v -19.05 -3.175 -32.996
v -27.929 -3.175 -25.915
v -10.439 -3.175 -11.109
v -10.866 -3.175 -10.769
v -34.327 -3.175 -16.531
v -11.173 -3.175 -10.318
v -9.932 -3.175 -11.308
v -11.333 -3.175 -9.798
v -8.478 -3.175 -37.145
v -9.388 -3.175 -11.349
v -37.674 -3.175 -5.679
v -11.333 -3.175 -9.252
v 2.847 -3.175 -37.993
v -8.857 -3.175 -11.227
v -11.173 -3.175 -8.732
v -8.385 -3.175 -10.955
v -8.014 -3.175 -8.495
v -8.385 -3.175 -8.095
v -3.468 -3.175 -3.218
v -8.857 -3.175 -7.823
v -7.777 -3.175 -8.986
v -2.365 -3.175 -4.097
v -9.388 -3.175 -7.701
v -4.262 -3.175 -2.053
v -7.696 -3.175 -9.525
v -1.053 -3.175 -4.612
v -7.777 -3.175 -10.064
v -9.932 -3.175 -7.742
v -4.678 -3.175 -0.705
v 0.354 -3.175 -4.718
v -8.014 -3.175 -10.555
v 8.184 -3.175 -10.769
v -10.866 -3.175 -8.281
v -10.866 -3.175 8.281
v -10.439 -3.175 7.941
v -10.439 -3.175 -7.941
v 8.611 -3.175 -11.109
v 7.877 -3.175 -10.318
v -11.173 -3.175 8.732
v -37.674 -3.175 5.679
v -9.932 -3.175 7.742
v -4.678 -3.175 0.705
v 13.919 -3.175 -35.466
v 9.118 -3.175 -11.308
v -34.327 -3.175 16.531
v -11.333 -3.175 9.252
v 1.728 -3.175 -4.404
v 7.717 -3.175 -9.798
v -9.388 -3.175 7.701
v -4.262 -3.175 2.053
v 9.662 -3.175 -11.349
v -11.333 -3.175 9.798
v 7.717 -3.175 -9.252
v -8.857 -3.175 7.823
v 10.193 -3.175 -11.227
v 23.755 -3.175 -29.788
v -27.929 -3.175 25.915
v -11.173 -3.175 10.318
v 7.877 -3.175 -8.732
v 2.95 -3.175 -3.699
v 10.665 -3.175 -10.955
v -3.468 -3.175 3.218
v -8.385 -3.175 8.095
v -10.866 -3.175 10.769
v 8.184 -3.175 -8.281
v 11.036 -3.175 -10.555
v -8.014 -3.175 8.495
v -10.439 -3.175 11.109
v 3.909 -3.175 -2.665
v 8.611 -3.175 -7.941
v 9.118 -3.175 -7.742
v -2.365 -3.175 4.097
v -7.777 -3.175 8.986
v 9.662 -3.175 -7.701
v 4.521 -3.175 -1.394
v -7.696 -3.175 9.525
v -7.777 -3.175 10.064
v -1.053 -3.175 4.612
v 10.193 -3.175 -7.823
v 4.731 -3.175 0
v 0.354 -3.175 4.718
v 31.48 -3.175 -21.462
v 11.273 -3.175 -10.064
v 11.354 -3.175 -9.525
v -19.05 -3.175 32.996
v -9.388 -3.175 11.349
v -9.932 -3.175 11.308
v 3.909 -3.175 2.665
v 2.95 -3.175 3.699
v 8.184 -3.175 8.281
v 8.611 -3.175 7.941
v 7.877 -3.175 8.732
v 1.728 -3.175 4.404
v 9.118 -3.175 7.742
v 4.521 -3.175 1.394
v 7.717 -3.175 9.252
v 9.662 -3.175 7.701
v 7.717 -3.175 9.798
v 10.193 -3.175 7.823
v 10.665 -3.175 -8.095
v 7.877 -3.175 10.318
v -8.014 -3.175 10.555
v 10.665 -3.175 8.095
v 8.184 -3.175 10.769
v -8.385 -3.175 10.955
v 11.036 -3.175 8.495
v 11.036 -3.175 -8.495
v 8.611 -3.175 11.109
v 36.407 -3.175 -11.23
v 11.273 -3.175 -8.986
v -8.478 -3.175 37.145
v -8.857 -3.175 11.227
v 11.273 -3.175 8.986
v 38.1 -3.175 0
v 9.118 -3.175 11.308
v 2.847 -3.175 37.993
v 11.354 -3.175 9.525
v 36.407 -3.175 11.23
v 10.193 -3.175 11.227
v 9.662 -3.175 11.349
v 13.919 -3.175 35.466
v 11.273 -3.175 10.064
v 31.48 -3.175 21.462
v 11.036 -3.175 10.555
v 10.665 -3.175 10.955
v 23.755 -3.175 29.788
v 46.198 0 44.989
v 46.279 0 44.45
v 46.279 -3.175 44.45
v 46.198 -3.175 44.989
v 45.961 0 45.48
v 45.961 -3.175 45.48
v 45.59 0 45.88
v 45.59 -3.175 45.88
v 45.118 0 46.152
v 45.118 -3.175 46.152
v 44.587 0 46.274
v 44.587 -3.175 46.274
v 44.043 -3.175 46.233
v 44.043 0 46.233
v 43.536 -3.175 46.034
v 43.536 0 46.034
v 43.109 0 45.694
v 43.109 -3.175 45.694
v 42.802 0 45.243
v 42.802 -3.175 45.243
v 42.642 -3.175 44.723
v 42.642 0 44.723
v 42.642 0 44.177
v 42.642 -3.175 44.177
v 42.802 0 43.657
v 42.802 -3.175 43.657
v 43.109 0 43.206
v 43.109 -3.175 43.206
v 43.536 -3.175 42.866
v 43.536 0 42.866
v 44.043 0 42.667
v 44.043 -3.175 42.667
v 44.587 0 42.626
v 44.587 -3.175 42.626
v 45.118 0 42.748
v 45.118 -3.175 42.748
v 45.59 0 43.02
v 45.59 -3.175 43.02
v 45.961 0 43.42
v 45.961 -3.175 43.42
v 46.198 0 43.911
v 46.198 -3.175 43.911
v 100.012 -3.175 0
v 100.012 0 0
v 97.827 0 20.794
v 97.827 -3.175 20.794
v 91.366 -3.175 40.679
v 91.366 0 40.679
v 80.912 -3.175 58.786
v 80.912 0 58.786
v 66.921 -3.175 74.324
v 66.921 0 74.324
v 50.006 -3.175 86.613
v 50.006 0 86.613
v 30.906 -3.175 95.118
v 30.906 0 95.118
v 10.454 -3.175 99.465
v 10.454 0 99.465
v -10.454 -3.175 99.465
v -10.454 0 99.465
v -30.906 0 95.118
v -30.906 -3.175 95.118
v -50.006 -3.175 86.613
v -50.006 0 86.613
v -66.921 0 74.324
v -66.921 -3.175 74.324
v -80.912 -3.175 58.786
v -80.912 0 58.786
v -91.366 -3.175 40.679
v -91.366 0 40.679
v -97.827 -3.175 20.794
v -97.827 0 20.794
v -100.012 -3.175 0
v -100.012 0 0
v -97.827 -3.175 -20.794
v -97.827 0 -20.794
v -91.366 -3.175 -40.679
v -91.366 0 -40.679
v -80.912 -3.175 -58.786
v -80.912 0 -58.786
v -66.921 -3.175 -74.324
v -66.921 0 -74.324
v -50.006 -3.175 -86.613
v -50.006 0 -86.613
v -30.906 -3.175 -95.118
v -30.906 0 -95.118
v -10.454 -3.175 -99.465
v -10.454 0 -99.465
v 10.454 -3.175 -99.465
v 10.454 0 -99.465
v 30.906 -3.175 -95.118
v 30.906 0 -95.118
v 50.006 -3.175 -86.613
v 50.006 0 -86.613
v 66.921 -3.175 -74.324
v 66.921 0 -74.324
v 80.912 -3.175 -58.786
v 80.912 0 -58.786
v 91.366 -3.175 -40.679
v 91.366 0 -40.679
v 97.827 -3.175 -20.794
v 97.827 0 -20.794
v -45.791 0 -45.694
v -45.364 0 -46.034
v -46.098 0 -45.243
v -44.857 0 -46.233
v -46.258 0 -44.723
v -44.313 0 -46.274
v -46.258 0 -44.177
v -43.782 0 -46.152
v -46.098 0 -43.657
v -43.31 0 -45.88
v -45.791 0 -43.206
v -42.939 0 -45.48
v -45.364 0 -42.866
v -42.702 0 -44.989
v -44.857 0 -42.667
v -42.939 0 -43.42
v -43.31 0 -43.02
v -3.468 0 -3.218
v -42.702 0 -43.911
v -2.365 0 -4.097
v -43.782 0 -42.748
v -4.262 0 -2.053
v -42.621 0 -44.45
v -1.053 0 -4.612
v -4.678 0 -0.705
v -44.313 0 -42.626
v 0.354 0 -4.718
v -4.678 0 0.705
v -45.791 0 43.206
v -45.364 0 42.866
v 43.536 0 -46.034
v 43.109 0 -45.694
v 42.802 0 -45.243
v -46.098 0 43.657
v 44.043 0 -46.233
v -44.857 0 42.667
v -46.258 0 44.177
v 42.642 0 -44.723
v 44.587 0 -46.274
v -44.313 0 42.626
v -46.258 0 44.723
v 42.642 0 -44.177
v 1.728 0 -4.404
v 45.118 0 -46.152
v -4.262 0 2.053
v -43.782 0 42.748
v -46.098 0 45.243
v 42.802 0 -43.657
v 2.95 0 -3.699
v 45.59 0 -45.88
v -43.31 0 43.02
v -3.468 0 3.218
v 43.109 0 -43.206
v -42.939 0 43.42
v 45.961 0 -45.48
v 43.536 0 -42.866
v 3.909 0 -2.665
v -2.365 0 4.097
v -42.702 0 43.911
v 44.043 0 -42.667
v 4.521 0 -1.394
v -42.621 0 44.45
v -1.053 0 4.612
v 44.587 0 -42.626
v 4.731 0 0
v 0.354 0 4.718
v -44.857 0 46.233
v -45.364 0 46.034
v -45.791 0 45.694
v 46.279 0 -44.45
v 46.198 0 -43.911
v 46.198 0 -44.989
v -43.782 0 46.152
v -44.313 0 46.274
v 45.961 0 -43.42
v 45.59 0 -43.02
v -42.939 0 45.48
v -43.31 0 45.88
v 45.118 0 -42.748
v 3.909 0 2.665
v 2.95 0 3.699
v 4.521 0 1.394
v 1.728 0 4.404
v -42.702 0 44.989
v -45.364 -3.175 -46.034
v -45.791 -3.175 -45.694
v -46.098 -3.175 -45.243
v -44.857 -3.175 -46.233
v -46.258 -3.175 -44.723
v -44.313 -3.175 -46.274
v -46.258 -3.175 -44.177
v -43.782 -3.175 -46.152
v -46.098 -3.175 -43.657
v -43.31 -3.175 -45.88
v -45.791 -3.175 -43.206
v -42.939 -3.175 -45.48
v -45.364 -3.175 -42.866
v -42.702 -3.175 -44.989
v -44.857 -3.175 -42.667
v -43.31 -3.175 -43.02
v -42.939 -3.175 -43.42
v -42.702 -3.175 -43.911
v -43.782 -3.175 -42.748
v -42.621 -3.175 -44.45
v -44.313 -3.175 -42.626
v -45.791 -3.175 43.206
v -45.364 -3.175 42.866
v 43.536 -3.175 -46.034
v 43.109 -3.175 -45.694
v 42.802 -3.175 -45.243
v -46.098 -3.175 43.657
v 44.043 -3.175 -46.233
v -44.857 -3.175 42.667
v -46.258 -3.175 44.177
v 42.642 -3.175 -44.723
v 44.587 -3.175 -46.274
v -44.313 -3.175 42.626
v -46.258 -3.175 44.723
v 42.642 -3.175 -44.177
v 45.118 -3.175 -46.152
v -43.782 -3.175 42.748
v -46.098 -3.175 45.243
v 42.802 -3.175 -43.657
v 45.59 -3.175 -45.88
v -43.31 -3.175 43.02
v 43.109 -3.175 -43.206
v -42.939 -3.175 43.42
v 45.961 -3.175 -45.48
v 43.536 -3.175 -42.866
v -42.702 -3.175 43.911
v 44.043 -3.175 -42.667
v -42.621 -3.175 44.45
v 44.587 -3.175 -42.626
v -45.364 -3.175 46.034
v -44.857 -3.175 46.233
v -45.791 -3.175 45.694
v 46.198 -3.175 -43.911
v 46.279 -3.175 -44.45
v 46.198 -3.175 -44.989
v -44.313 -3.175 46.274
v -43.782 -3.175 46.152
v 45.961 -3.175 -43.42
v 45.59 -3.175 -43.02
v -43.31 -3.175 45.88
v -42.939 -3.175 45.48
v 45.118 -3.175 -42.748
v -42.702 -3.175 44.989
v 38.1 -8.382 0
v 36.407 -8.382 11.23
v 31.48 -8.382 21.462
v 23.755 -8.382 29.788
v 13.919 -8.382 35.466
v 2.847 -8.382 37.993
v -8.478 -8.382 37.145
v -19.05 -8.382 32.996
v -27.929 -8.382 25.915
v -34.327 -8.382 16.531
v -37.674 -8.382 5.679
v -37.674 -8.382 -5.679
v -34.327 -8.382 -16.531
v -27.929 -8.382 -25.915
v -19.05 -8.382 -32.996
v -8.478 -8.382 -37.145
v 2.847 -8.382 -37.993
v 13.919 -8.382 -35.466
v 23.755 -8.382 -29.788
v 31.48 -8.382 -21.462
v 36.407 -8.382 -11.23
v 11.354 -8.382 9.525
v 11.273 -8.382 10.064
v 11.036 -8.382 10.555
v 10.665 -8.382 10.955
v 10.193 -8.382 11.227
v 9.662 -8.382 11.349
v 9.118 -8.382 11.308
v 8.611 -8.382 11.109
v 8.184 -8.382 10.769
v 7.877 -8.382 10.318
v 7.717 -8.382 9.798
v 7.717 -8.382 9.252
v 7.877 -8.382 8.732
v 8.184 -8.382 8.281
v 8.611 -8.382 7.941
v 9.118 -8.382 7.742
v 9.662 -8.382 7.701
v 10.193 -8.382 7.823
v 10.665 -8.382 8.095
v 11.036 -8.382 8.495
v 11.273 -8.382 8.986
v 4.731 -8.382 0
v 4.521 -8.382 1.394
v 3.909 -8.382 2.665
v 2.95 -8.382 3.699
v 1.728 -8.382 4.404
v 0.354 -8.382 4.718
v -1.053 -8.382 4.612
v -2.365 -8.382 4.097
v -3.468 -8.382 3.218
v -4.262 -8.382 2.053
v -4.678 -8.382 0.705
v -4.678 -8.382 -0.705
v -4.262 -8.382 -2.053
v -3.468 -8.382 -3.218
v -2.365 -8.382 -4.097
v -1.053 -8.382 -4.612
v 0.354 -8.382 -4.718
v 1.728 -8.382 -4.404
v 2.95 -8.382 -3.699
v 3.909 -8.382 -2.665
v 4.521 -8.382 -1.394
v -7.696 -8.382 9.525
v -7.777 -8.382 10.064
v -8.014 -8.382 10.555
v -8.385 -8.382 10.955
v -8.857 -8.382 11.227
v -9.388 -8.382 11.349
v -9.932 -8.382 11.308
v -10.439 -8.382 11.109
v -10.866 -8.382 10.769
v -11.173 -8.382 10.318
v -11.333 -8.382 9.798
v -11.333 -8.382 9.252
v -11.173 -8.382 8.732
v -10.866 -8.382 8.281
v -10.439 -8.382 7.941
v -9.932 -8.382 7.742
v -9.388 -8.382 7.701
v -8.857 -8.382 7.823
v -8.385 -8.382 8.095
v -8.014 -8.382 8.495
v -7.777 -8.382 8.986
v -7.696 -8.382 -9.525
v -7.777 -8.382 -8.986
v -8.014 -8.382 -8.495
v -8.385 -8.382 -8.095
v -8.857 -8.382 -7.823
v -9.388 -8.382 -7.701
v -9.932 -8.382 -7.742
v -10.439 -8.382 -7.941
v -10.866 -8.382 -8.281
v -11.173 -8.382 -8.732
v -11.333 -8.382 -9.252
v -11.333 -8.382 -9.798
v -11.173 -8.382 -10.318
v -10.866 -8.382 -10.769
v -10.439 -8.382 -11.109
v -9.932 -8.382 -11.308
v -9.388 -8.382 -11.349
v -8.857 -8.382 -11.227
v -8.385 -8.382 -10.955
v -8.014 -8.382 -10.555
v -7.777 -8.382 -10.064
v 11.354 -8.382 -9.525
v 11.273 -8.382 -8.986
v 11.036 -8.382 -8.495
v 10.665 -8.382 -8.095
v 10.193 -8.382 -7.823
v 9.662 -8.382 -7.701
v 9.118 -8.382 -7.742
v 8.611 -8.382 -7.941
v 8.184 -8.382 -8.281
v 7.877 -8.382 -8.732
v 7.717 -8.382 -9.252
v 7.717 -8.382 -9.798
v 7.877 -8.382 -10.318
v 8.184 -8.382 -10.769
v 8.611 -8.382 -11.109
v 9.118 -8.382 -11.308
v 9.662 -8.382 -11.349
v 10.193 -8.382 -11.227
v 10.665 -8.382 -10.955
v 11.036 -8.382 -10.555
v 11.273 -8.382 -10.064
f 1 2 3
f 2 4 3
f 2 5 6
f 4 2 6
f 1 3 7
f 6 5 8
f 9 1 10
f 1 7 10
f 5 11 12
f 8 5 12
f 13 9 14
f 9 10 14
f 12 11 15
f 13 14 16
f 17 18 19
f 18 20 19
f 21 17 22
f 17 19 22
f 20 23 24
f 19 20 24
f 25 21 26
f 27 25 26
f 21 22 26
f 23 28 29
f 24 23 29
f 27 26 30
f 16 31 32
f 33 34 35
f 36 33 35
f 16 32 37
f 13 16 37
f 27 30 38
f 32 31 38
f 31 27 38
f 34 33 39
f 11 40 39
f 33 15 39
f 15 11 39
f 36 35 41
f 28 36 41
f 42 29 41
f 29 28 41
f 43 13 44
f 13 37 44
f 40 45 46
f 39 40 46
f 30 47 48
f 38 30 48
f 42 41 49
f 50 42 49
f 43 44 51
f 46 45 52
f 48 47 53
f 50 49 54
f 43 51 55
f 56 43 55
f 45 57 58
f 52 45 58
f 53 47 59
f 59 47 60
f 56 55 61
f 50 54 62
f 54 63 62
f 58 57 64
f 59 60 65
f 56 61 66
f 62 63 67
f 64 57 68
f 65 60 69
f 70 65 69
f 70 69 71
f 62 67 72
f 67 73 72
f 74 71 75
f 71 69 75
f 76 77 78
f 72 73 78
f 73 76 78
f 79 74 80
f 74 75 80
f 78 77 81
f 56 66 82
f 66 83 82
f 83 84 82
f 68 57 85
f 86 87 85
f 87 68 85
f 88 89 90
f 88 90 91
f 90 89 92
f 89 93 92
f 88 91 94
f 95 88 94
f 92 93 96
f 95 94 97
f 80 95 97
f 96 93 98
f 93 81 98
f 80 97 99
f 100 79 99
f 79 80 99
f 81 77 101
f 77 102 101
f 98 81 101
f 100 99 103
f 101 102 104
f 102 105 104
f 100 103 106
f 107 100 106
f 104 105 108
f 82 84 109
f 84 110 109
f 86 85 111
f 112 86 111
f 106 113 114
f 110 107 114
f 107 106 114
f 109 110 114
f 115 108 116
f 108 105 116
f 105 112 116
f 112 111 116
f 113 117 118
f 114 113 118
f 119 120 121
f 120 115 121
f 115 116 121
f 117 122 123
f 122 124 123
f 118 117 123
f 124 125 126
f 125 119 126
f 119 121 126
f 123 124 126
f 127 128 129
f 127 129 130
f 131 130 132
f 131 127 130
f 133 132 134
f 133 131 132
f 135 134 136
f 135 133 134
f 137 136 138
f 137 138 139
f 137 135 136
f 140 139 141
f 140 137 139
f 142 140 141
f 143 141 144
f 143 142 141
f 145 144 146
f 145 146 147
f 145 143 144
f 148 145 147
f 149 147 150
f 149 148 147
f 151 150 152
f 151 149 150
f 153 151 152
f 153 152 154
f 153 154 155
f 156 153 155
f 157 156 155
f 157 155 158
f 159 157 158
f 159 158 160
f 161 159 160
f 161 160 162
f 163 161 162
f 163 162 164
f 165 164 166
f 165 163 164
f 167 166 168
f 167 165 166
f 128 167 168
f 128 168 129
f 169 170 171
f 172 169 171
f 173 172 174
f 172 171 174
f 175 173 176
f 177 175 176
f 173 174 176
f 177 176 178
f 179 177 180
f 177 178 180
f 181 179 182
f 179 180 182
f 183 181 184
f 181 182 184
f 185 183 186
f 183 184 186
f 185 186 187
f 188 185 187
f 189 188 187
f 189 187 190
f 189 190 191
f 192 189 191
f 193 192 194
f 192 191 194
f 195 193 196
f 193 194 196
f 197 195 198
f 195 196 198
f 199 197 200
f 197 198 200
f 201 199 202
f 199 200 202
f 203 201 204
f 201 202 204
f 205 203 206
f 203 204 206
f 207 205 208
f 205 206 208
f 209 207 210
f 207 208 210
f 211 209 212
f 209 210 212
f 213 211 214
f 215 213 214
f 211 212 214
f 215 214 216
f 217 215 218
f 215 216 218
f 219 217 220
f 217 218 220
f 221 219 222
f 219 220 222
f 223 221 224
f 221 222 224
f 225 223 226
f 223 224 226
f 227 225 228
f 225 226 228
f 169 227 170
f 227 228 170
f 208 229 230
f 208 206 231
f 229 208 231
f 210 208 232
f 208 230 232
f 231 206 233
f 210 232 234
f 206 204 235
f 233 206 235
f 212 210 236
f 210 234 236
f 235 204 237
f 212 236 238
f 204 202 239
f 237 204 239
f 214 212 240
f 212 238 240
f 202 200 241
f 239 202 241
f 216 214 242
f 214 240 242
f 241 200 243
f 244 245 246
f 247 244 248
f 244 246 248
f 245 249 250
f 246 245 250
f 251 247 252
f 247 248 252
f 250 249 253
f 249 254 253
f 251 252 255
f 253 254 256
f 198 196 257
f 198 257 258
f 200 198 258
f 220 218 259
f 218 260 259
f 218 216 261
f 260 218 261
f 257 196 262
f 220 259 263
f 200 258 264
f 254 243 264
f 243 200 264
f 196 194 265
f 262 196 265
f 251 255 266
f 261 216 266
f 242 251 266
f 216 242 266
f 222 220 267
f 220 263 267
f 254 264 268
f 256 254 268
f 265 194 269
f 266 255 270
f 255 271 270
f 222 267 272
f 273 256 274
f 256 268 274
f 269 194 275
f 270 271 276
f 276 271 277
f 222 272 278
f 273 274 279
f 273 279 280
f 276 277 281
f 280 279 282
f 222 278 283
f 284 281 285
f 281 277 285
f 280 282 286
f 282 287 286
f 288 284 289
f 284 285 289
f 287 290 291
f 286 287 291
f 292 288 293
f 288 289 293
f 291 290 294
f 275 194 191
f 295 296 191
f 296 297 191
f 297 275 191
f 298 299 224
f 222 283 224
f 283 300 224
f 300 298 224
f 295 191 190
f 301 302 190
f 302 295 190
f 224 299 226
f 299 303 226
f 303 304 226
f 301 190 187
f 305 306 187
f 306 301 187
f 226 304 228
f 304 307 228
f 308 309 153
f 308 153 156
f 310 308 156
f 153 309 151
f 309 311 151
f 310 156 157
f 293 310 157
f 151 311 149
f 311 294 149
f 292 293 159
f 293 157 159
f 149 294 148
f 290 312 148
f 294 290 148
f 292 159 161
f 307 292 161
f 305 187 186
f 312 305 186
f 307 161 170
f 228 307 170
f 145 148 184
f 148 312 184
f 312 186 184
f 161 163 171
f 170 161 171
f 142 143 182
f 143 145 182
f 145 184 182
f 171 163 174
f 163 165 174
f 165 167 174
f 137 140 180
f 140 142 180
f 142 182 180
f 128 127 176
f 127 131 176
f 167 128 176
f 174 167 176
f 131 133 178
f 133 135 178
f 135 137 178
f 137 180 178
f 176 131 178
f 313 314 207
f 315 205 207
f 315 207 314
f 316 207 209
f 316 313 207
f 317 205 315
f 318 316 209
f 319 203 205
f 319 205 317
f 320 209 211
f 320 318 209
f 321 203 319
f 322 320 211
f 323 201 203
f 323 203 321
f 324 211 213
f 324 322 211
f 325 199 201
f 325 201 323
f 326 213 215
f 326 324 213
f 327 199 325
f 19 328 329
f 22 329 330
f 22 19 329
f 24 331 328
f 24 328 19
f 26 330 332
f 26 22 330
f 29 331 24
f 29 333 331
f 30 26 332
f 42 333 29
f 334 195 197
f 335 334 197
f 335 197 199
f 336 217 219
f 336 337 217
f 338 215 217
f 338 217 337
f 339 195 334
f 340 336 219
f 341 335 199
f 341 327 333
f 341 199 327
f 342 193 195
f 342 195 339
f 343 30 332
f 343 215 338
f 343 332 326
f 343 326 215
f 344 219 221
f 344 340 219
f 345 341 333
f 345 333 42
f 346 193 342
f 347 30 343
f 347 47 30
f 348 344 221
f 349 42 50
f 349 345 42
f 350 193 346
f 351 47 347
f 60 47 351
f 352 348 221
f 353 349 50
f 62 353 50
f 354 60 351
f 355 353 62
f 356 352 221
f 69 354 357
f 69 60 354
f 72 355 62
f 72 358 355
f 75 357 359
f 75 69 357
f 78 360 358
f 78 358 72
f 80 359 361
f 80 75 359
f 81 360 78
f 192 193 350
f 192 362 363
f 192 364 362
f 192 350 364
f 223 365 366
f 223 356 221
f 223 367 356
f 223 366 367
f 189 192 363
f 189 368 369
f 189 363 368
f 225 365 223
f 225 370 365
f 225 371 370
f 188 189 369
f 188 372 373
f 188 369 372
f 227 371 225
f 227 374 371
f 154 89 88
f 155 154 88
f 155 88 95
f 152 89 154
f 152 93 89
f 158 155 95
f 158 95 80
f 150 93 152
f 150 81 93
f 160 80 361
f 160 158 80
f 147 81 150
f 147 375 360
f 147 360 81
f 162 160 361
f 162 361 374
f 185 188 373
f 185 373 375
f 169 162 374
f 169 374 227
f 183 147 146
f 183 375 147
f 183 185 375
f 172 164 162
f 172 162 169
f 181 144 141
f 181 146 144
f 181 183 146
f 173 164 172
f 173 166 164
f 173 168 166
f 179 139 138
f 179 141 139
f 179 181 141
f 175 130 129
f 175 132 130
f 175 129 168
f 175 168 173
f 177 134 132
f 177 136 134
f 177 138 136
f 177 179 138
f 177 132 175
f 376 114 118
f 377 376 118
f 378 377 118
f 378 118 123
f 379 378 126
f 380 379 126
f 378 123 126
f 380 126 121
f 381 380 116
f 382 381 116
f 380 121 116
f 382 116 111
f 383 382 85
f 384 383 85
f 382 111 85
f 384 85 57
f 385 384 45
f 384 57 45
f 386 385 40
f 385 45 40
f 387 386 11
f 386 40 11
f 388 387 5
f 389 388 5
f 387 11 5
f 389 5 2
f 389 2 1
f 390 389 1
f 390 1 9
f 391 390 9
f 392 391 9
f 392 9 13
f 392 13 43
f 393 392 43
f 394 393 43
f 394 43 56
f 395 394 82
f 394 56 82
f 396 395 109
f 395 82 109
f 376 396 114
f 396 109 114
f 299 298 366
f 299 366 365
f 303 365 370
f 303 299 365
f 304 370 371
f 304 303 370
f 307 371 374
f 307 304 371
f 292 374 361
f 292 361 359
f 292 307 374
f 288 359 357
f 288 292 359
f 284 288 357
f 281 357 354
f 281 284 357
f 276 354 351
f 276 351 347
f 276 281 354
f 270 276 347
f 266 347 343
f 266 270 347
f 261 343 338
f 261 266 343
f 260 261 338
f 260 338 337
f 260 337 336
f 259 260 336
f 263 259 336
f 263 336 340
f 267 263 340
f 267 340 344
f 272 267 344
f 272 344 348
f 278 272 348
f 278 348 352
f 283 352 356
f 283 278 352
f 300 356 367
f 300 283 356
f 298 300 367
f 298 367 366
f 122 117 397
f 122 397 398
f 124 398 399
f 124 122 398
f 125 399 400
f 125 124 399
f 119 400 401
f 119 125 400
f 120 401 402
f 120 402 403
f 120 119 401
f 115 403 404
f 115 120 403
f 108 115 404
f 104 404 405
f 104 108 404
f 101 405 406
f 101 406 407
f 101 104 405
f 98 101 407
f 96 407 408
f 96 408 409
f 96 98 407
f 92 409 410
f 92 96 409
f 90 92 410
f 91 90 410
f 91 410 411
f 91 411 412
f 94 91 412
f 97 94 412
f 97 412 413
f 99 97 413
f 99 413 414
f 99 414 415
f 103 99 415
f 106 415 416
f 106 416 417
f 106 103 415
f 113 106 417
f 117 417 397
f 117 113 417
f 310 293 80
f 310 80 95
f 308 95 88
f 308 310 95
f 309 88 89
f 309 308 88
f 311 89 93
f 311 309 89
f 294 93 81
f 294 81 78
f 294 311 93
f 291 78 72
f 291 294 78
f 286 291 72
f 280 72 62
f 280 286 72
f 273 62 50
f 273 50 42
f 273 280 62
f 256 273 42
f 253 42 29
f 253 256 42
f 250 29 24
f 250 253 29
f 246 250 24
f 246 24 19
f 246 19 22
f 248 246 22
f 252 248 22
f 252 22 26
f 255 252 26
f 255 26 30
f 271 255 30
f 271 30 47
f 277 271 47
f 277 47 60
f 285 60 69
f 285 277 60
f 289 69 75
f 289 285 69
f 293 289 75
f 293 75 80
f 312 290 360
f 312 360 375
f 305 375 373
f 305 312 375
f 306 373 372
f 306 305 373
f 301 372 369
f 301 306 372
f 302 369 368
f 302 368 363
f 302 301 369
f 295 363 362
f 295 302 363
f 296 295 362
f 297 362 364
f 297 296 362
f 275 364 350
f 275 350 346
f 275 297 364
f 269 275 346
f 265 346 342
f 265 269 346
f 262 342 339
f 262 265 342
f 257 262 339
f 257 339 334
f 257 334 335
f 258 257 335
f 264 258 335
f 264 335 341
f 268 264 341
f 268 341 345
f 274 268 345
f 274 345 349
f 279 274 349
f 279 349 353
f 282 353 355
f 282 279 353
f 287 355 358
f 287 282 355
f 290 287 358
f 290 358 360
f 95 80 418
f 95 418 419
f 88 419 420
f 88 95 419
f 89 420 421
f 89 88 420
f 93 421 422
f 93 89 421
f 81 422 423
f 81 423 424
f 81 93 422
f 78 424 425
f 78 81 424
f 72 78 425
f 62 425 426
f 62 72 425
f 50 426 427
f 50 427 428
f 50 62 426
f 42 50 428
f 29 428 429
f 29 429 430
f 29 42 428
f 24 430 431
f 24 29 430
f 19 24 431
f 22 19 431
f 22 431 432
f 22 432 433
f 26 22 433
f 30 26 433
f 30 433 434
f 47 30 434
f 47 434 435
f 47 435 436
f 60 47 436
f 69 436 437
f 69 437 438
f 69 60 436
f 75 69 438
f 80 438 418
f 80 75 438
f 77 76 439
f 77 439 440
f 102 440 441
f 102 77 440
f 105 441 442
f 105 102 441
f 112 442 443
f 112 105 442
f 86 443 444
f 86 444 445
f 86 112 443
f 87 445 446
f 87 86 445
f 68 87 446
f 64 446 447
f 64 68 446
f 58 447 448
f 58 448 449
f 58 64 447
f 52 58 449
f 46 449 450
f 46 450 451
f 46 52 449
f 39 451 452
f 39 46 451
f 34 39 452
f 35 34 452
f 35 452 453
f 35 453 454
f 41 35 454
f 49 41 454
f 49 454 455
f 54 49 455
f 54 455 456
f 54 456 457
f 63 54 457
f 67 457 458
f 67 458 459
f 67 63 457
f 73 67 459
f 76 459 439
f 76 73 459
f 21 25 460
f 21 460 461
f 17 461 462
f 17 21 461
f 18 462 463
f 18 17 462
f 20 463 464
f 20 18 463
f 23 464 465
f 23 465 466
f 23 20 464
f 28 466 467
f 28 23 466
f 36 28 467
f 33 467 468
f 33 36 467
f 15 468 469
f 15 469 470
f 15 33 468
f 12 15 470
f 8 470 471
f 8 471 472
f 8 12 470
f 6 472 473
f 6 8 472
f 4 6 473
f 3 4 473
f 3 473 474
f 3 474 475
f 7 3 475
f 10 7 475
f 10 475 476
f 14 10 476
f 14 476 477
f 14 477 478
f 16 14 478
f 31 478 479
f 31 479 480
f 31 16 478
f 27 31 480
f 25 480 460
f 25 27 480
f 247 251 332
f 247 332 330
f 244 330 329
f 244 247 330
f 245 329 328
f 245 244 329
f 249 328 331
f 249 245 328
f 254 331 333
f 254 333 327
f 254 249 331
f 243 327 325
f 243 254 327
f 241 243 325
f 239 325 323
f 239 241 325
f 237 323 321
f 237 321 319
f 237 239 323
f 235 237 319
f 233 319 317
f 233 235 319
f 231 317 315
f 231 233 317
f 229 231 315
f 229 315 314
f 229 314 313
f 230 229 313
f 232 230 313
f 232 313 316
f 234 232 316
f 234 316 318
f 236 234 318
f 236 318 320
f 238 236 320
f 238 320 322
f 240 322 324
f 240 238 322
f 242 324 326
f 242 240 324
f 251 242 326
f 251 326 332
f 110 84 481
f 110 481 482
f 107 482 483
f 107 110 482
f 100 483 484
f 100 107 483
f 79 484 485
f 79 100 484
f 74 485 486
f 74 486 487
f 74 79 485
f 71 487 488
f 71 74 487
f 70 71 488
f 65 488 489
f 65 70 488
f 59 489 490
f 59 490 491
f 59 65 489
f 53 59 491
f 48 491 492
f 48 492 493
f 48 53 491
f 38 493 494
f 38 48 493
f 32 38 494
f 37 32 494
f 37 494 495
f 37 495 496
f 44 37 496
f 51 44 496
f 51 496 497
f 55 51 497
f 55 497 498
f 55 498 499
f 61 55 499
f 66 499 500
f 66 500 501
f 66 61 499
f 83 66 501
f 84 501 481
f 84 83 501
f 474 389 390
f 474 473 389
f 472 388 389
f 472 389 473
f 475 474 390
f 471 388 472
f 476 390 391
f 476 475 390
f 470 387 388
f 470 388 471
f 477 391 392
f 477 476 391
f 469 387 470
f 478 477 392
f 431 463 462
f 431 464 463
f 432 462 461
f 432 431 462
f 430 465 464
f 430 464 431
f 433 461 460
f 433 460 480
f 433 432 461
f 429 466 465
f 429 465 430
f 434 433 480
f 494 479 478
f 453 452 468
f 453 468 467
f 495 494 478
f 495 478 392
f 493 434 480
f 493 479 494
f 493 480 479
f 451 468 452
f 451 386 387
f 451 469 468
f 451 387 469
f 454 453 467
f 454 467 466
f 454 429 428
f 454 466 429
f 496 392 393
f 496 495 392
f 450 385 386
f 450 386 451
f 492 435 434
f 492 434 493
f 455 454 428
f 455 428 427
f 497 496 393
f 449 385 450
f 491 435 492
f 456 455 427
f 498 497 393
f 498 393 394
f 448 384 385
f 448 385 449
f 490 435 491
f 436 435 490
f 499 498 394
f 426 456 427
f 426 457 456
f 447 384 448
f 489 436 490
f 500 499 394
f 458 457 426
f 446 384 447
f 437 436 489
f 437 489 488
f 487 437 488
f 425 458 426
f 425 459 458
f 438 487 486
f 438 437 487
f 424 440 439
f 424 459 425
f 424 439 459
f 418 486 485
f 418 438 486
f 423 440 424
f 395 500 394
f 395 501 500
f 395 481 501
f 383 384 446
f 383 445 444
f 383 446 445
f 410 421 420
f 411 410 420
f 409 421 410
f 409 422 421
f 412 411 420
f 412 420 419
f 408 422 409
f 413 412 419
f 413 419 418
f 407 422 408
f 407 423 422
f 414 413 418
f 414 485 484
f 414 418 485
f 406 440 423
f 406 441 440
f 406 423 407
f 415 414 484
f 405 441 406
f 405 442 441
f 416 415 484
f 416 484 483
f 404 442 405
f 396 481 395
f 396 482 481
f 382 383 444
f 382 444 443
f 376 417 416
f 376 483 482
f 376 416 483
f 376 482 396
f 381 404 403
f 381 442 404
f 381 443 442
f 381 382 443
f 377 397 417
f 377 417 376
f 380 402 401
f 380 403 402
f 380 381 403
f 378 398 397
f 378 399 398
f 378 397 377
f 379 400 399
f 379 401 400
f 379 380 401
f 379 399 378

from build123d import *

# Parameters (mm, degrees)
F0_R     = 100.0125
F0_R_2   = 1.8288
F0_R_3   = 4.73075
F1_DEPTH = 3.175
F2_R     = 38.1
F2_R_2   = 1.8288
F2_R_3   = 4.73075
F3_DEPTH = 5.207


with BuildPart() as f1:
    # F0 (on Front) → F1 (new body)
    with BuildSketch(Plane.XZ):
        Circle(F0_R)
        with Locations((-44.45, -44.45)):
            Circle(F0_R_2, mode=Mode.SUBTRACT)
        Circle(F0_R_3, mode=Mode.SUBTRACT)
        with Locations((44.45, -44.45)):
            Circle(F0_R_2, mode=Mode.SUBTRACT)
        with Locations((-44.45, 44.45)):
            Circle(F0_R_2, mode=Mode.SUBTRACT)
        with Locations((44.45, 44.45)):
            Circle(F0_R_2, mode=Mode.SUBTRACT)
    extrude(amount=F1_DEPTH)


with BuildPart() as f3:
    # F2 (on face) → F3 (new body)
    with BuildSketch(Plane.XZ.offset(3.175)):
        Circle(F2_R)
        with Locations((-9.525, -9.525)):
            Circle(F2_R_2, mode=Mode.SUBTRACT)
        Circle(F2_R_3, mode=Mode.SUBTRACT)
        with Locations((9.525, -9.525)):
            Circle(F2_R_2, mode=Mode.SUBTRACT)
        with Locations((-9.525, 9.525)):
            Circle(F2_R_2, mode=Mode.SUBTRACT)
        with Locations((9.525, 9.525)):
            Circle(F2_R_2, mode=Mode.SUBTRACT)
    extrude(amount=F3_DEPTH)


solid = Compound([f1.part, f3.part])
